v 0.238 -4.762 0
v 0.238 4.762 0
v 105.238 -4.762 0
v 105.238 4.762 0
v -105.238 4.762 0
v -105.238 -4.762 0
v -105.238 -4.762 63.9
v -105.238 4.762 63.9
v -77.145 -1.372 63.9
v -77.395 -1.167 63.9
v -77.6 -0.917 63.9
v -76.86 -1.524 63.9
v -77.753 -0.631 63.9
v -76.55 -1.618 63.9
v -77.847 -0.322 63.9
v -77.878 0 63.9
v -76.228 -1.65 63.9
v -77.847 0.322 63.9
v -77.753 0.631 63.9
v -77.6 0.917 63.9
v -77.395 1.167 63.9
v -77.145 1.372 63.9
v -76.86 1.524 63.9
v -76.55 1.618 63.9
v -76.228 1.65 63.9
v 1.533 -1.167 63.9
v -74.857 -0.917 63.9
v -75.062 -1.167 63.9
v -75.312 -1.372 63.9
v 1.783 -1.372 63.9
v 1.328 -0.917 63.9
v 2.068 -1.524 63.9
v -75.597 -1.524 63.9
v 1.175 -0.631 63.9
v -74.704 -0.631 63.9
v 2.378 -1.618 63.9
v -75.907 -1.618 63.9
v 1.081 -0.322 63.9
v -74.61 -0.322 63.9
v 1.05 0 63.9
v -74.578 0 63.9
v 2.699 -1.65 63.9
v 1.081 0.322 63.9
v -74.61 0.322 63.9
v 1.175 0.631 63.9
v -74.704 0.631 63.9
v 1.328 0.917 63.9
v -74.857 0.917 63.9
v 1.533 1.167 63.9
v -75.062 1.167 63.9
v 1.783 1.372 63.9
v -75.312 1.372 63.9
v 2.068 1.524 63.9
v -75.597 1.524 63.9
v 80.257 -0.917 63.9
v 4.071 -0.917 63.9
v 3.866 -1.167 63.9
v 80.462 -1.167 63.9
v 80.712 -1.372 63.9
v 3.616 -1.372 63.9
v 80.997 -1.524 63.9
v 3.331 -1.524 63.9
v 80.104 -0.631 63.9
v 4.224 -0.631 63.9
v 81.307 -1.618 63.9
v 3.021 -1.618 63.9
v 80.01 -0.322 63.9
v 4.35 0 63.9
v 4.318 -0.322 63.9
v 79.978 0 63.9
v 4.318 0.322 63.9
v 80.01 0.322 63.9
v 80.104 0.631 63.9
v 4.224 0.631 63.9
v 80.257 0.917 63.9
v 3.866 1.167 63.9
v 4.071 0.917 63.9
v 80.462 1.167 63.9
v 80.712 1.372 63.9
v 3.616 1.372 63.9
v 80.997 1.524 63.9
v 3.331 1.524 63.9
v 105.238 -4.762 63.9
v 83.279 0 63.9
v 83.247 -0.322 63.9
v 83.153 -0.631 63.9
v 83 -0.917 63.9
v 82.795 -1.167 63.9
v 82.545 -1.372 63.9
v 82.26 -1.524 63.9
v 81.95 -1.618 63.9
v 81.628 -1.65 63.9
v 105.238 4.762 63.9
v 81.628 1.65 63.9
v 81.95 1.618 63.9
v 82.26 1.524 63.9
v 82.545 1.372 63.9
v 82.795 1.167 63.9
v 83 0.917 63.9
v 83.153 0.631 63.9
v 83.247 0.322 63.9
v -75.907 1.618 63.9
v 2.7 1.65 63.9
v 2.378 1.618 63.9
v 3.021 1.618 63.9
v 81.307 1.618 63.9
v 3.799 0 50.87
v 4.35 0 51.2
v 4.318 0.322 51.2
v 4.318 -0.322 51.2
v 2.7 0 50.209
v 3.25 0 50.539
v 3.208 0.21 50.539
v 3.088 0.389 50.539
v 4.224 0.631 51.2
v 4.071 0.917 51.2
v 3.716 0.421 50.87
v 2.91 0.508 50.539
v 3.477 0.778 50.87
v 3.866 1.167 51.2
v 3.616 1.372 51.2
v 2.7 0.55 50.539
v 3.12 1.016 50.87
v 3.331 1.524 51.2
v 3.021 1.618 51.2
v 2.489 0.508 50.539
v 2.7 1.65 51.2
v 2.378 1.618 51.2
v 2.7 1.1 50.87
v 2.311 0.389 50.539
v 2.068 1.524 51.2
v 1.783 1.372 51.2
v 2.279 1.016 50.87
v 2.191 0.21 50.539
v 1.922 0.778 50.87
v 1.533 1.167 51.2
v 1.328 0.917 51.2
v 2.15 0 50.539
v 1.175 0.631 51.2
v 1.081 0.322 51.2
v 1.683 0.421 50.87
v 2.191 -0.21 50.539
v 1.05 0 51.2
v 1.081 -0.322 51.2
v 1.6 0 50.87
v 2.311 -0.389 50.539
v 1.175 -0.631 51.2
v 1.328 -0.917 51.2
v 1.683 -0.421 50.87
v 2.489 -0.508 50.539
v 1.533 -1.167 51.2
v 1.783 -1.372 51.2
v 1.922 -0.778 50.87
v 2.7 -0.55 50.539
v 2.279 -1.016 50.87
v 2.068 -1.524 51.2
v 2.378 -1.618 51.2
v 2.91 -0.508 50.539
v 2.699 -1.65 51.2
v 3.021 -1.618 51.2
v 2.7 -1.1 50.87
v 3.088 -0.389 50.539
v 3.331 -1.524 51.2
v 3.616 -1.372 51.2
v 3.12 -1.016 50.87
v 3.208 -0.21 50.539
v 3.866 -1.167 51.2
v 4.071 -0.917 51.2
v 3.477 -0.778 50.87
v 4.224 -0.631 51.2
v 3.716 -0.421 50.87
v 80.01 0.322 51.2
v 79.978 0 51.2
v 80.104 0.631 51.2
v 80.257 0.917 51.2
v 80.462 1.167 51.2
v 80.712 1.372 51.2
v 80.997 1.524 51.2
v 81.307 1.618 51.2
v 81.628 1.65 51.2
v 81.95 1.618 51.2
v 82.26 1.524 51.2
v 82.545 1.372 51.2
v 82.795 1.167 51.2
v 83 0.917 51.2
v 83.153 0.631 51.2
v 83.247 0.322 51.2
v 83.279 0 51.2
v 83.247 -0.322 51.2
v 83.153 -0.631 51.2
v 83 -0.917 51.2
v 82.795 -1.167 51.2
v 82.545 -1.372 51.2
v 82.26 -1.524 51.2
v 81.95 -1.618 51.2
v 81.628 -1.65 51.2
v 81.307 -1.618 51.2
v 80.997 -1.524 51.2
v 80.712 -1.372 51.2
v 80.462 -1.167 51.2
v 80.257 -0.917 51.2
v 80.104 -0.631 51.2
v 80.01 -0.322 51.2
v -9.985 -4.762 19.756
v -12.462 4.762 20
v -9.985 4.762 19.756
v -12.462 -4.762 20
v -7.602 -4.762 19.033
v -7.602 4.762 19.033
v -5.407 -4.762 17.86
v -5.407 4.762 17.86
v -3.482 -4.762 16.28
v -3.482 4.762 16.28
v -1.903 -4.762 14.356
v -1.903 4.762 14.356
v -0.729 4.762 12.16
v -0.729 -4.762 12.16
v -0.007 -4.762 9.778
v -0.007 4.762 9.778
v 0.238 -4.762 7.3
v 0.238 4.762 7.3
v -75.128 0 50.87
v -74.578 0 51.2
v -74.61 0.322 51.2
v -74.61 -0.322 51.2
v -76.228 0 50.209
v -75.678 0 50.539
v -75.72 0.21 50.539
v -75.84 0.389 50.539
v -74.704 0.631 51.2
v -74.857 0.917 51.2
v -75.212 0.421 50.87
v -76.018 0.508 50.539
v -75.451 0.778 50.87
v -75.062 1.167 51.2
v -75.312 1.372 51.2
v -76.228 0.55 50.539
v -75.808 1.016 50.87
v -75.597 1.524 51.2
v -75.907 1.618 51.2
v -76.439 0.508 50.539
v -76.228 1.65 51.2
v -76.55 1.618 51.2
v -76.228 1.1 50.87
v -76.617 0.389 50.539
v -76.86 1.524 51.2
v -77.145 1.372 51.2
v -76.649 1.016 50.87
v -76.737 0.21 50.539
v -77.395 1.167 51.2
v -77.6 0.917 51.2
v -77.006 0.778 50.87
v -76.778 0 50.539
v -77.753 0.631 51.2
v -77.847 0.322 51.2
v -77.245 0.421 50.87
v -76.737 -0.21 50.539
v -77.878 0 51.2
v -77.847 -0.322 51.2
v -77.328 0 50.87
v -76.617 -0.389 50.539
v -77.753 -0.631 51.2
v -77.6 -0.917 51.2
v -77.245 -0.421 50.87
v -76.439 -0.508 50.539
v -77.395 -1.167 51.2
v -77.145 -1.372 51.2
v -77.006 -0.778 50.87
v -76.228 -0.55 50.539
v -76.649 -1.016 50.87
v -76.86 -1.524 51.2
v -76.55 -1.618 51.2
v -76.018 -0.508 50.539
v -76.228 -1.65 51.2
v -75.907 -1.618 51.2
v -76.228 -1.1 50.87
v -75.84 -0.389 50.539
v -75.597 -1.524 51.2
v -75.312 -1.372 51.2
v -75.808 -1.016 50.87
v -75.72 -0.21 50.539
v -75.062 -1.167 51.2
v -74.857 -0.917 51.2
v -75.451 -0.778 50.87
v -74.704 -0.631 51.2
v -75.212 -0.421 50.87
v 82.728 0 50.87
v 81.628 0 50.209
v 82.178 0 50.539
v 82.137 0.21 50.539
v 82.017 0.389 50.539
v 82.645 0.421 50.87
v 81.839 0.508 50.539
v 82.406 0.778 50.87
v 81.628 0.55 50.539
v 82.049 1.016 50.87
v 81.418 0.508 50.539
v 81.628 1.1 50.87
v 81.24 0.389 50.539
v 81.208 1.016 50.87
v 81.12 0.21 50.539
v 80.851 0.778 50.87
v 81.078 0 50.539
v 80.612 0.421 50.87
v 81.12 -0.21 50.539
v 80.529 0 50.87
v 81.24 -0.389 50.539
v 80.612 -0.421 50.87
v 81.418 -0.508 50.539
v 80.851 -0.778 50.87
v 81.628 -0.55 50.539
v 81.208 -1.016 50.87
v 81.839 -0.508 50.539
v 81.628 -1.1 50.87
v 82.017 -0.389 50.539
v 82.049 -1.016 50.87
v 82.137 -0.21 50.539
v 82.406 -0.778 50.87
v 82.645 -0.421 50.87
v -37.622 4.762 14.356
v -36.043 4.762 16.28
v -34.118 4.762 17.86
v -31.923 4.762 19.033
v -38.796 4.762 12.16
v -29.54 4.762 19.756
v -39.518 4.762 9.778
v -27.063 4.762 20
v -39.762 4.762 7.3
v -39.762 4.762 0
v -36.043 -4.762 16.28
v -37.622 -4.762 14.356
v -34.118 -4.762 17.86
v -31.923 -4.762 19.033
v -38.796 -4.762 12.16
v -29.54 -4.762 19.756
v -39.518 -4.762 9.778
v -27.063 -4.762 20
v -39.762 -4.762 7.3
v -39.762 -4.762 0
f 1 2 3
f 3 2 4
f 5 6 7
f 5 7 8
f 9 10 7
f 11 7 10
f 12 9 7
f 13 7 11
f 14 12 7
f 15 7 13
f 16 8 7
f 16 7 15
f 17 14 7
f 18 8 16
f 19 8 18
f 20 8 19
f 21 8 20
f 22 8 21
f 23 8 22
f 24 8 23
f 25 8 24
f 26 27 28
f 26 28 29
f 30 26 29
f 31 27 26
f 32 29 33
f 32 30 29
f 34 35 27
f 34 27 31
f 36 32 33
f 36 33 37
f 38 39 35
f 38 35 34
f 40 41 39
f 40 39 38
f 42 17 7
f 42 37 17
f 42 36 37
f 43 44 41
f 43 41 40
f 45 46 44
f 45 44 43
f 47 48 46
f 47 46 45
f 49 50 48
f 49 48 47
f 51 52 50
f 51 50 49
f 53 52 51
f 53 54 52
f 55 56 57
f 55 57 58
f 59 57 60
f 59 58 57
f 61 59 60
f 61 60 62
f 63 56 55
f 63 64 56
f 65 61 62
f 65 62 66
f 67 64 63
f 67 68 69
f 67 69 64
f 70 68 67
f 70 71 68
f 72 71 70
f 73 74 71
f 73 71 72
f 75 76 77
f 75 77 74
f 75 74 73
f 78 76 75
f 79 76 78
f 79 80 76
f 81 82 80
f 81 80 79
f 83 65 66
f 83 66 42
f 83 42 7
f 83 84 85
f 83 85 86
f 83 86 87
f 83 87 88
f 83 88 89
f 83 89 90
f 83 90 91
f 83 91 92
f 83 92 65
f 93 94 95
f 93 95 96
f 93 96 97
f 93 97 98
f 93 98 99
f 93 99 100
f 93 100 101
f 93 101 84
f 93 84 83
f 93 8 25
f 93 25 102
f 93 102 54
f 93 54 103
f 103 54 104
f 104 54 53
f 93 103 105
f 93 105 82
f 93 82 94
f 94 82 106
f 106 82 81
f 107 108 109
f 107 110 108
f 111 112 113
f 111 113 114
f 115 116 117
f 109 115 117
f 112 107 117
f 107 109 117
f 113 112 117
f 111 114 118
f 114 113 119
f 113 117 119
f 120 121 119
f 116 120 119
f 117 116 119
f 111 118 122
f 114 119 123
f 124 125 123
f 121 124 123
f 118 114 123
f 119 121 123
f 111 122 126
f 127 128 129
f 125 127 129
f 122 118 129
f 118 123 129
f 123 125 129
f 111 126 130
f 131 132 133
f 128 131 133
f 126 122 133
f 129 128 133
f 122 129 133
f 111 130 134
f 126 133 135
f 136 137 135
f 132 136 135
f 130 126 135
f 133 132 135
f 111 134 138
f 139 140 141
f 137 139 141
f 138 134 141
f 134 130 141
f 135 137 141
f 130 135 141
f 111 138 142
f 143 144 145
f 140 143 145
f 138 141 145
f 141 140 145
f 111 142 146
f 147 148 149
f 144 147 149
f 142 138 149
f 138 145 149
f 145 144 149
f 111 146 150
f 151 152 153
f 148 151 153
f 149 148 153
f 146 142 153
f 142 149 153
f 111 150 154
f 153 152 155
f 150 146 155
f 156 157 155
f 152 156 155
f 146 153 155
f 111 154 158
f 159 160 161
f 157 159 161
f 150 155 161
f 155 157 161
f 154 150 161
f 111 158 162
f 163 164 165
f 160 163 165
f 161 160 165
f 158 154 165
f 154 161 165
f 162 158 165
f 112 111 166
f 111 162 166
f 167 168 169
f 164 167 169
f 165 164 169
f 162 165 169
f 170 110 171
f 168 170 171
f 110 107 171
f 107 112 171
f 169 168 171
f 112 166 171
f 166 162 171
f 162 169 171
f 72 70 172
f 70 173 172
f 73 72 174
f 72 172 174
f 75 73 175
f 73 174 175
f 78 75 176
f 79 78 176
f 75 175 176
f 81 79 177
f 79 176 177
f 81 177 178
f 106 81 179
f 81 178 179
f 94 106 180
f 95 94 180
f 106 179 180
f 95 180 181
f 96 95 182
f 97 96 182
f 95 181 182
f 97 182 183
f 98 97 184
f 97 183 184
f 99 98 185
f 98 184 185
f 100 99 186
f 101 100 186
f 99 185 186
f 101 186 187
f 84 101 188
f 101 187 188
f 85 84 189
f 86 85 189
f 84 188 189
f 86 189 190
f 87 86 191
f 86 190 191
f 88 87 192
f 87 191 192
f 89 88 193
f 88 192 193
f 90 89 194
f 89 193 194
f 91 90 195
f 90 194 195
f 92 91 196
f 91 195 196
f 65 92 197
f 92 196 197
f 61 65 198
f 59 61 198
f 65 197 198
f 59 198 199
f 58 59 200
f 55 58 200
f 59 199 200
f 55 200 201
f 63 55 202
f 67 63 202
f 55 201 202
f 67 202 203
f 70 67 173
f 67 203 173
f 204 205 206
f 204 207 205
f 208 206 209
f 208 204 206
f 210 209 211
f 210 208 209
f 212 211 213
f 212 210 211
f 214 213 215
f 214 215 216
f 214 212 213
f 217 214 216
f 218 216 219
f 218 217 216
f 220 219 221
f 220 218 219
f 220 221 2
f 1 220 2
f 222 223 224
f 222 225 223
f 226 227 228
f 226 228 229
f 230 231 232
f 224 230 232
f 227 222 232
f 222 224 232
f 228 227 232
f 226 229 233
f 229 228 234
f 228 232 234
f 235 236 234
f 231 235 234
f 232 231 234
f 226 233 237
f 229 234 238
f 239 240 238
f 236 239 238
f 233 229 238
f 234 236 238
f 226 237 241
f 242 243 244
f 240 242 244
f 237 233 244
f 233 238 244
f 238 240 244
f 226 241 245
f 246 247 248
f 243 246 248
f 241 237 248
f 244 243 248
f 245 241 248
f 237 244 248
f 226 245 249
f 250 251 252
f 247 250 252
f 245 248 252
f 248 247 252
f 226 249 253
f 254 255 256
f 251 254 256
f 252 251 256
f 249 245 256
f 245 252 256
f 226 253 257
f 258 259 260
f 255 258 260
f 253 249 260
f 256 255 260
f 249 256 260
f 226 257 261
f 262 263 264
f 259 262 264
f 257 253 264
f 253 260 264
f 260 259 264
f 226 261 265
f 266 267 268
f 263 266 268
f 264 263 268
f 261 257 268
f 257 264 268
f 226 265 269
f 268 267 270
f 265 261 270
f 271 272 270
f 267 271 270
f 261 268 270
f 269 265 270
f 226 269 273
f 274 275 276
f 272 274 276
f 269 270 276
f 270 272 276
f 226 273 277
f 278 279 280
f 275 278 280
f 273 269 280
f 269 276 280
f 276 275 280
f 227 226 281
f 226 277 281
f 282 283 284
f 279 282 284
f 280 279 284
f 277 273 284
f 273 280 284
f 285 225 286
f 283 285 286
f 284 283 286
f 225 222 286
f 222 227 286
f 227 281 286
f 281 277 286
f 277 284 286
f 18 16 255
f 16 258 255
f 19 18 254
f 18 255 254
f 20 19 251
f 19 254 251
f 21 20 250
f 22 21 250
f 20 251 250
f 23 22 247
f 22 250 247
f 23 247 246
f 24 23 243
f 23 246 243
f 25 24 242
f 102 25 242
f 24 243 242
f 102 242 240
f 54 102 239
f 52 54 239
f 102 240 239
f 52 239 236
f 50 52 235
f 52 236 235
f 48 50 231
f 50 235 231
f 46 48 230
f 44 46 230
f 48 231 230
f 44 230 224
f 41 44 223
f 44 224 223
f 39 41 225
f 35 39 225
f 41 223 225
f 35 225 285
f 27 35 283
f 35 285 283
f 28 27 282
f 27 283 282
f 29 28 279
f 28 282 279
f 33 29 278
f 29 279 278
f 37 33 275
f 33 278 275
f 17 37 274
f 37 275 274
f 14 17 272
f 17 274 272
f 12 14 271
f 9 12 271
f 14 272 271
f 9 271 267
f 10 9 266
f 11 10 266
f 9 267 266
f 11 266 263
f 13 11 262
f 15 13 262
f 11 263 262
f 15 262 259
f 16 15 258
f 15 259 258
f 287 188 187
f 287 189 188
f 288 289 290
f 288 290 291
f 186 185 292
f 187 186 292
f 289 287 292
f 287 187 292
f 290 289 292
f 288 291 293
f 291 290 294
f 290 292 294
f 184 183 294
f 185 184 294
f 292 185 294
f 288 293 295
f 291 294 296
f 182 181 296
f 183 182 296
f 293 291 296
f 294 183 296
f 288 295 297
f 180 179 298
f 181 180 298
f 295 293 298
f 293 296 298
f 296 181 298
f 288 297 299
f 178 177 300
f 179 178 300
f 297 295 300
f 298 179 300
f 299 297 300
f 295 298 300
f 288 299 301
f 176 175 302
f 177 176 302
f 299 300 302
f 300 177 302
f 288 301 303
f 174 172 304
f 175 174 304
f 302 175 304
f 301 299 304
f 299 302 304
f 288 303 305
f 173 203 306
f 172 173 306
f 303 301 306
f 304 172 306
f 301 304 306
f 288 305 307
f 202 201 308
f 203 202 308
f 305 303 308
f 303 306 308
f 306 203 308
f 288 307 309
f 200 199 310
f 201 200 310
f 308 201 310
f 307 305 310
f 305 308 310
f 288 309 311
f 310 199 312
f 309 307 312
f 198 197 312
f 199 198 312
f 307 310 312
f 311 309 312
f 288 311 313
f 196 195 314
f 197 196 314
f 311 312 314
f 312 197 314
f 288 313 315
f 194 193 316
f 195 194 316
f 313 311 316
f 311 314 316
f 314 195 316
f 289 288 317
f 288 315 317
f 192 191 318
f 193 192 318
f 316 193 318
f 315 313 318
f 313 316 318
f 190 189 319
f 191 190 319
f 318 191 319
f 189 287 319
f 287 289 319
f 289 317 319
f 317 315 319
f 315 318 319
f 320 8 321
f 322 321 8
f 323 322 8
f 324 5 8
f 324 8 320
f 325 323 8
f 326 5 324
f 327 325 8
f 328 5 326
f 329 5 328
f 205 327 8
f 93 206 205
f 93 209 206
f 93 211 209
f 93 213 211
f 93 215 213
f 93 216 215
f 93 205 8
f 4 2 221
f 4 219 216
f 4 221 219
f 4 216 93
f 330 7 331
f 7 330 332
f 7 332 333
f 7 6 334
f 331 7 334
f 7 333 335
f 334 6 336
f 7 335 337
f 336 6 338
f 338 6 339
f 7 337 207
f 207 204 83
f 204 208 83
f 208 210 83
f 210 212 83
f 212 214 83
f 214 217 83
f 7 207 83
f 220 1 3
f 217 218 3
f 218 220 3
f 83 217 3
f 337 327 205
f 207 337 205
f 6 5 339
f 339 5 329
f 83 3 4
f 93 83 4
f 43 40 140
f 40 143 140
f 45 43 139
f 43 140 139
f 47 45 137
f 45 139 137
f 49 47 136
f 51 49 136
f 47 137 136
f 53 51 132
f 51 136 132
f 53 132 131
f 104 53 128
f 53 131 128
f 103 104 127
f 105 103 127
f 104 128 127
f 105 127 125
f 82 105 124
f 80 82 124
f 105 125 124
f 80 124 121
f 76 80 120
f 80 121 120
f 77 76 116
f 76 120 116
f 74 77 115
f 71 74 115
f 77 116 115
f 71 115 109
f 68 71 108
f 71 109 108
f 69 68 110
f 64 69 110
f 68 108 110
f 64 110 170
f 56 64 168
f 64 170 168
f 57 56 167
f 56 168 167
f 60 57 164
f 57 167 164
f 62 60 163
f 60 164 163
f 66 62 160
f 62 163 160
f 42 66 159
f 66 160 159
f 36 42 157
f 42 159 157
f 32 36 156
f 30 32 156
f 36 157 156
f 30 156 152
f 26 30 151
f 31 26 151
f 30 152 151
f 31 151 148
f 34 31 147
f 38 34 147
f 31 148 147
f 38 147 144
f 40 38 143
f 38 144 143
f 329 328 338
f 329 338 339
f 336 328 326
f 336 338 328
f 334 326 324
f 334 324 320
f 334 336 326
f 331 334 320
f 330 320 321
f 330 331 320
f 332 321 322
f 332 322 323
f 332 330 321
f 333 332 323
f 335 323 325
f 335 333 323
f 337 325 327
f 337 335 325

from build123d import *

# Parameters (mm, degrees)
SKETCH1_W                   = 210.475
SKETCH1_H                   = 9.525
BOSS_EXTRUDE1_DEPTH         = 63.9
SKETCH2_W                   = 40
SKETCH2_H                   = 20
CUT_EXTRUDE1_DEPTH          = 10.525
FILLET1_R                   = 12.7
TAP_DRILL_FOR_M4_TAP1_D     = 3.3
TAP_DRILL_FOR_M4_TAP1_DEPTH = 12.7
TAP_DRILL_FOR_M4_TAP1_TIP   = 0.991420021


with BuildPart() as part:
    # Sketch1 → Boss-Extrude1 (new body)
    with BuildSketch(Plane.XY):
        Rectangle(SKETCH1_W, SKETCH1_H)
    extrude(amount=BOSS_EXTRUDE1_DEPTH)

    # Sketch2 → Cut-Extrude1 (cut, through all)
    with BuildSketch(Plane(origin=(0, 4.7625, 0), x_dir=(1, 0, 0), z_dir=(0, 1, 0))):
        with Locations((-19.7625, -10)):
            Rectangle(SKETCH2_W, SKETCH2_H)
    extrude(amount=-CUT_EXTRUDE1_DEPTH, mode=Mode.SUBTRACT)

    # Fillet1
    fillet1_edges = [part.edges().sort_by_distance(p)[0] for p in [
        (-39.7625, 0, 20),
        (0.2375, 0, 20),
    ]]
    fillet(fillet1_edges, radius=FILLET1_R)

    # Tap Drill for M4 Tap1
    with Locations(Plane.XY.offset(63.9)):
        with Locations((-76.2285, 0), (2.6995, 0), (81.6285, 0)):
            Hole(TAP_DRILL_FOR_M4_TAP1_D / 2, depth=TAP_DRILL_FOR_M4_TAP1_DEPTH)
            with Locations((0, 0, -(TAP_DRILL_FOR_M4_TAP1_DEPTH + TAP_DRILL_FOR_M4_TAP1_TIP / 2))):  # 118° drill point
                Cone(0, TAP_DRILL_FOR_M4_TAP1_D / 2, TAP_DRILL_FOR_M4_TAP1_TIP, mode=Mode.SUBTRACT)


solid = part.part
